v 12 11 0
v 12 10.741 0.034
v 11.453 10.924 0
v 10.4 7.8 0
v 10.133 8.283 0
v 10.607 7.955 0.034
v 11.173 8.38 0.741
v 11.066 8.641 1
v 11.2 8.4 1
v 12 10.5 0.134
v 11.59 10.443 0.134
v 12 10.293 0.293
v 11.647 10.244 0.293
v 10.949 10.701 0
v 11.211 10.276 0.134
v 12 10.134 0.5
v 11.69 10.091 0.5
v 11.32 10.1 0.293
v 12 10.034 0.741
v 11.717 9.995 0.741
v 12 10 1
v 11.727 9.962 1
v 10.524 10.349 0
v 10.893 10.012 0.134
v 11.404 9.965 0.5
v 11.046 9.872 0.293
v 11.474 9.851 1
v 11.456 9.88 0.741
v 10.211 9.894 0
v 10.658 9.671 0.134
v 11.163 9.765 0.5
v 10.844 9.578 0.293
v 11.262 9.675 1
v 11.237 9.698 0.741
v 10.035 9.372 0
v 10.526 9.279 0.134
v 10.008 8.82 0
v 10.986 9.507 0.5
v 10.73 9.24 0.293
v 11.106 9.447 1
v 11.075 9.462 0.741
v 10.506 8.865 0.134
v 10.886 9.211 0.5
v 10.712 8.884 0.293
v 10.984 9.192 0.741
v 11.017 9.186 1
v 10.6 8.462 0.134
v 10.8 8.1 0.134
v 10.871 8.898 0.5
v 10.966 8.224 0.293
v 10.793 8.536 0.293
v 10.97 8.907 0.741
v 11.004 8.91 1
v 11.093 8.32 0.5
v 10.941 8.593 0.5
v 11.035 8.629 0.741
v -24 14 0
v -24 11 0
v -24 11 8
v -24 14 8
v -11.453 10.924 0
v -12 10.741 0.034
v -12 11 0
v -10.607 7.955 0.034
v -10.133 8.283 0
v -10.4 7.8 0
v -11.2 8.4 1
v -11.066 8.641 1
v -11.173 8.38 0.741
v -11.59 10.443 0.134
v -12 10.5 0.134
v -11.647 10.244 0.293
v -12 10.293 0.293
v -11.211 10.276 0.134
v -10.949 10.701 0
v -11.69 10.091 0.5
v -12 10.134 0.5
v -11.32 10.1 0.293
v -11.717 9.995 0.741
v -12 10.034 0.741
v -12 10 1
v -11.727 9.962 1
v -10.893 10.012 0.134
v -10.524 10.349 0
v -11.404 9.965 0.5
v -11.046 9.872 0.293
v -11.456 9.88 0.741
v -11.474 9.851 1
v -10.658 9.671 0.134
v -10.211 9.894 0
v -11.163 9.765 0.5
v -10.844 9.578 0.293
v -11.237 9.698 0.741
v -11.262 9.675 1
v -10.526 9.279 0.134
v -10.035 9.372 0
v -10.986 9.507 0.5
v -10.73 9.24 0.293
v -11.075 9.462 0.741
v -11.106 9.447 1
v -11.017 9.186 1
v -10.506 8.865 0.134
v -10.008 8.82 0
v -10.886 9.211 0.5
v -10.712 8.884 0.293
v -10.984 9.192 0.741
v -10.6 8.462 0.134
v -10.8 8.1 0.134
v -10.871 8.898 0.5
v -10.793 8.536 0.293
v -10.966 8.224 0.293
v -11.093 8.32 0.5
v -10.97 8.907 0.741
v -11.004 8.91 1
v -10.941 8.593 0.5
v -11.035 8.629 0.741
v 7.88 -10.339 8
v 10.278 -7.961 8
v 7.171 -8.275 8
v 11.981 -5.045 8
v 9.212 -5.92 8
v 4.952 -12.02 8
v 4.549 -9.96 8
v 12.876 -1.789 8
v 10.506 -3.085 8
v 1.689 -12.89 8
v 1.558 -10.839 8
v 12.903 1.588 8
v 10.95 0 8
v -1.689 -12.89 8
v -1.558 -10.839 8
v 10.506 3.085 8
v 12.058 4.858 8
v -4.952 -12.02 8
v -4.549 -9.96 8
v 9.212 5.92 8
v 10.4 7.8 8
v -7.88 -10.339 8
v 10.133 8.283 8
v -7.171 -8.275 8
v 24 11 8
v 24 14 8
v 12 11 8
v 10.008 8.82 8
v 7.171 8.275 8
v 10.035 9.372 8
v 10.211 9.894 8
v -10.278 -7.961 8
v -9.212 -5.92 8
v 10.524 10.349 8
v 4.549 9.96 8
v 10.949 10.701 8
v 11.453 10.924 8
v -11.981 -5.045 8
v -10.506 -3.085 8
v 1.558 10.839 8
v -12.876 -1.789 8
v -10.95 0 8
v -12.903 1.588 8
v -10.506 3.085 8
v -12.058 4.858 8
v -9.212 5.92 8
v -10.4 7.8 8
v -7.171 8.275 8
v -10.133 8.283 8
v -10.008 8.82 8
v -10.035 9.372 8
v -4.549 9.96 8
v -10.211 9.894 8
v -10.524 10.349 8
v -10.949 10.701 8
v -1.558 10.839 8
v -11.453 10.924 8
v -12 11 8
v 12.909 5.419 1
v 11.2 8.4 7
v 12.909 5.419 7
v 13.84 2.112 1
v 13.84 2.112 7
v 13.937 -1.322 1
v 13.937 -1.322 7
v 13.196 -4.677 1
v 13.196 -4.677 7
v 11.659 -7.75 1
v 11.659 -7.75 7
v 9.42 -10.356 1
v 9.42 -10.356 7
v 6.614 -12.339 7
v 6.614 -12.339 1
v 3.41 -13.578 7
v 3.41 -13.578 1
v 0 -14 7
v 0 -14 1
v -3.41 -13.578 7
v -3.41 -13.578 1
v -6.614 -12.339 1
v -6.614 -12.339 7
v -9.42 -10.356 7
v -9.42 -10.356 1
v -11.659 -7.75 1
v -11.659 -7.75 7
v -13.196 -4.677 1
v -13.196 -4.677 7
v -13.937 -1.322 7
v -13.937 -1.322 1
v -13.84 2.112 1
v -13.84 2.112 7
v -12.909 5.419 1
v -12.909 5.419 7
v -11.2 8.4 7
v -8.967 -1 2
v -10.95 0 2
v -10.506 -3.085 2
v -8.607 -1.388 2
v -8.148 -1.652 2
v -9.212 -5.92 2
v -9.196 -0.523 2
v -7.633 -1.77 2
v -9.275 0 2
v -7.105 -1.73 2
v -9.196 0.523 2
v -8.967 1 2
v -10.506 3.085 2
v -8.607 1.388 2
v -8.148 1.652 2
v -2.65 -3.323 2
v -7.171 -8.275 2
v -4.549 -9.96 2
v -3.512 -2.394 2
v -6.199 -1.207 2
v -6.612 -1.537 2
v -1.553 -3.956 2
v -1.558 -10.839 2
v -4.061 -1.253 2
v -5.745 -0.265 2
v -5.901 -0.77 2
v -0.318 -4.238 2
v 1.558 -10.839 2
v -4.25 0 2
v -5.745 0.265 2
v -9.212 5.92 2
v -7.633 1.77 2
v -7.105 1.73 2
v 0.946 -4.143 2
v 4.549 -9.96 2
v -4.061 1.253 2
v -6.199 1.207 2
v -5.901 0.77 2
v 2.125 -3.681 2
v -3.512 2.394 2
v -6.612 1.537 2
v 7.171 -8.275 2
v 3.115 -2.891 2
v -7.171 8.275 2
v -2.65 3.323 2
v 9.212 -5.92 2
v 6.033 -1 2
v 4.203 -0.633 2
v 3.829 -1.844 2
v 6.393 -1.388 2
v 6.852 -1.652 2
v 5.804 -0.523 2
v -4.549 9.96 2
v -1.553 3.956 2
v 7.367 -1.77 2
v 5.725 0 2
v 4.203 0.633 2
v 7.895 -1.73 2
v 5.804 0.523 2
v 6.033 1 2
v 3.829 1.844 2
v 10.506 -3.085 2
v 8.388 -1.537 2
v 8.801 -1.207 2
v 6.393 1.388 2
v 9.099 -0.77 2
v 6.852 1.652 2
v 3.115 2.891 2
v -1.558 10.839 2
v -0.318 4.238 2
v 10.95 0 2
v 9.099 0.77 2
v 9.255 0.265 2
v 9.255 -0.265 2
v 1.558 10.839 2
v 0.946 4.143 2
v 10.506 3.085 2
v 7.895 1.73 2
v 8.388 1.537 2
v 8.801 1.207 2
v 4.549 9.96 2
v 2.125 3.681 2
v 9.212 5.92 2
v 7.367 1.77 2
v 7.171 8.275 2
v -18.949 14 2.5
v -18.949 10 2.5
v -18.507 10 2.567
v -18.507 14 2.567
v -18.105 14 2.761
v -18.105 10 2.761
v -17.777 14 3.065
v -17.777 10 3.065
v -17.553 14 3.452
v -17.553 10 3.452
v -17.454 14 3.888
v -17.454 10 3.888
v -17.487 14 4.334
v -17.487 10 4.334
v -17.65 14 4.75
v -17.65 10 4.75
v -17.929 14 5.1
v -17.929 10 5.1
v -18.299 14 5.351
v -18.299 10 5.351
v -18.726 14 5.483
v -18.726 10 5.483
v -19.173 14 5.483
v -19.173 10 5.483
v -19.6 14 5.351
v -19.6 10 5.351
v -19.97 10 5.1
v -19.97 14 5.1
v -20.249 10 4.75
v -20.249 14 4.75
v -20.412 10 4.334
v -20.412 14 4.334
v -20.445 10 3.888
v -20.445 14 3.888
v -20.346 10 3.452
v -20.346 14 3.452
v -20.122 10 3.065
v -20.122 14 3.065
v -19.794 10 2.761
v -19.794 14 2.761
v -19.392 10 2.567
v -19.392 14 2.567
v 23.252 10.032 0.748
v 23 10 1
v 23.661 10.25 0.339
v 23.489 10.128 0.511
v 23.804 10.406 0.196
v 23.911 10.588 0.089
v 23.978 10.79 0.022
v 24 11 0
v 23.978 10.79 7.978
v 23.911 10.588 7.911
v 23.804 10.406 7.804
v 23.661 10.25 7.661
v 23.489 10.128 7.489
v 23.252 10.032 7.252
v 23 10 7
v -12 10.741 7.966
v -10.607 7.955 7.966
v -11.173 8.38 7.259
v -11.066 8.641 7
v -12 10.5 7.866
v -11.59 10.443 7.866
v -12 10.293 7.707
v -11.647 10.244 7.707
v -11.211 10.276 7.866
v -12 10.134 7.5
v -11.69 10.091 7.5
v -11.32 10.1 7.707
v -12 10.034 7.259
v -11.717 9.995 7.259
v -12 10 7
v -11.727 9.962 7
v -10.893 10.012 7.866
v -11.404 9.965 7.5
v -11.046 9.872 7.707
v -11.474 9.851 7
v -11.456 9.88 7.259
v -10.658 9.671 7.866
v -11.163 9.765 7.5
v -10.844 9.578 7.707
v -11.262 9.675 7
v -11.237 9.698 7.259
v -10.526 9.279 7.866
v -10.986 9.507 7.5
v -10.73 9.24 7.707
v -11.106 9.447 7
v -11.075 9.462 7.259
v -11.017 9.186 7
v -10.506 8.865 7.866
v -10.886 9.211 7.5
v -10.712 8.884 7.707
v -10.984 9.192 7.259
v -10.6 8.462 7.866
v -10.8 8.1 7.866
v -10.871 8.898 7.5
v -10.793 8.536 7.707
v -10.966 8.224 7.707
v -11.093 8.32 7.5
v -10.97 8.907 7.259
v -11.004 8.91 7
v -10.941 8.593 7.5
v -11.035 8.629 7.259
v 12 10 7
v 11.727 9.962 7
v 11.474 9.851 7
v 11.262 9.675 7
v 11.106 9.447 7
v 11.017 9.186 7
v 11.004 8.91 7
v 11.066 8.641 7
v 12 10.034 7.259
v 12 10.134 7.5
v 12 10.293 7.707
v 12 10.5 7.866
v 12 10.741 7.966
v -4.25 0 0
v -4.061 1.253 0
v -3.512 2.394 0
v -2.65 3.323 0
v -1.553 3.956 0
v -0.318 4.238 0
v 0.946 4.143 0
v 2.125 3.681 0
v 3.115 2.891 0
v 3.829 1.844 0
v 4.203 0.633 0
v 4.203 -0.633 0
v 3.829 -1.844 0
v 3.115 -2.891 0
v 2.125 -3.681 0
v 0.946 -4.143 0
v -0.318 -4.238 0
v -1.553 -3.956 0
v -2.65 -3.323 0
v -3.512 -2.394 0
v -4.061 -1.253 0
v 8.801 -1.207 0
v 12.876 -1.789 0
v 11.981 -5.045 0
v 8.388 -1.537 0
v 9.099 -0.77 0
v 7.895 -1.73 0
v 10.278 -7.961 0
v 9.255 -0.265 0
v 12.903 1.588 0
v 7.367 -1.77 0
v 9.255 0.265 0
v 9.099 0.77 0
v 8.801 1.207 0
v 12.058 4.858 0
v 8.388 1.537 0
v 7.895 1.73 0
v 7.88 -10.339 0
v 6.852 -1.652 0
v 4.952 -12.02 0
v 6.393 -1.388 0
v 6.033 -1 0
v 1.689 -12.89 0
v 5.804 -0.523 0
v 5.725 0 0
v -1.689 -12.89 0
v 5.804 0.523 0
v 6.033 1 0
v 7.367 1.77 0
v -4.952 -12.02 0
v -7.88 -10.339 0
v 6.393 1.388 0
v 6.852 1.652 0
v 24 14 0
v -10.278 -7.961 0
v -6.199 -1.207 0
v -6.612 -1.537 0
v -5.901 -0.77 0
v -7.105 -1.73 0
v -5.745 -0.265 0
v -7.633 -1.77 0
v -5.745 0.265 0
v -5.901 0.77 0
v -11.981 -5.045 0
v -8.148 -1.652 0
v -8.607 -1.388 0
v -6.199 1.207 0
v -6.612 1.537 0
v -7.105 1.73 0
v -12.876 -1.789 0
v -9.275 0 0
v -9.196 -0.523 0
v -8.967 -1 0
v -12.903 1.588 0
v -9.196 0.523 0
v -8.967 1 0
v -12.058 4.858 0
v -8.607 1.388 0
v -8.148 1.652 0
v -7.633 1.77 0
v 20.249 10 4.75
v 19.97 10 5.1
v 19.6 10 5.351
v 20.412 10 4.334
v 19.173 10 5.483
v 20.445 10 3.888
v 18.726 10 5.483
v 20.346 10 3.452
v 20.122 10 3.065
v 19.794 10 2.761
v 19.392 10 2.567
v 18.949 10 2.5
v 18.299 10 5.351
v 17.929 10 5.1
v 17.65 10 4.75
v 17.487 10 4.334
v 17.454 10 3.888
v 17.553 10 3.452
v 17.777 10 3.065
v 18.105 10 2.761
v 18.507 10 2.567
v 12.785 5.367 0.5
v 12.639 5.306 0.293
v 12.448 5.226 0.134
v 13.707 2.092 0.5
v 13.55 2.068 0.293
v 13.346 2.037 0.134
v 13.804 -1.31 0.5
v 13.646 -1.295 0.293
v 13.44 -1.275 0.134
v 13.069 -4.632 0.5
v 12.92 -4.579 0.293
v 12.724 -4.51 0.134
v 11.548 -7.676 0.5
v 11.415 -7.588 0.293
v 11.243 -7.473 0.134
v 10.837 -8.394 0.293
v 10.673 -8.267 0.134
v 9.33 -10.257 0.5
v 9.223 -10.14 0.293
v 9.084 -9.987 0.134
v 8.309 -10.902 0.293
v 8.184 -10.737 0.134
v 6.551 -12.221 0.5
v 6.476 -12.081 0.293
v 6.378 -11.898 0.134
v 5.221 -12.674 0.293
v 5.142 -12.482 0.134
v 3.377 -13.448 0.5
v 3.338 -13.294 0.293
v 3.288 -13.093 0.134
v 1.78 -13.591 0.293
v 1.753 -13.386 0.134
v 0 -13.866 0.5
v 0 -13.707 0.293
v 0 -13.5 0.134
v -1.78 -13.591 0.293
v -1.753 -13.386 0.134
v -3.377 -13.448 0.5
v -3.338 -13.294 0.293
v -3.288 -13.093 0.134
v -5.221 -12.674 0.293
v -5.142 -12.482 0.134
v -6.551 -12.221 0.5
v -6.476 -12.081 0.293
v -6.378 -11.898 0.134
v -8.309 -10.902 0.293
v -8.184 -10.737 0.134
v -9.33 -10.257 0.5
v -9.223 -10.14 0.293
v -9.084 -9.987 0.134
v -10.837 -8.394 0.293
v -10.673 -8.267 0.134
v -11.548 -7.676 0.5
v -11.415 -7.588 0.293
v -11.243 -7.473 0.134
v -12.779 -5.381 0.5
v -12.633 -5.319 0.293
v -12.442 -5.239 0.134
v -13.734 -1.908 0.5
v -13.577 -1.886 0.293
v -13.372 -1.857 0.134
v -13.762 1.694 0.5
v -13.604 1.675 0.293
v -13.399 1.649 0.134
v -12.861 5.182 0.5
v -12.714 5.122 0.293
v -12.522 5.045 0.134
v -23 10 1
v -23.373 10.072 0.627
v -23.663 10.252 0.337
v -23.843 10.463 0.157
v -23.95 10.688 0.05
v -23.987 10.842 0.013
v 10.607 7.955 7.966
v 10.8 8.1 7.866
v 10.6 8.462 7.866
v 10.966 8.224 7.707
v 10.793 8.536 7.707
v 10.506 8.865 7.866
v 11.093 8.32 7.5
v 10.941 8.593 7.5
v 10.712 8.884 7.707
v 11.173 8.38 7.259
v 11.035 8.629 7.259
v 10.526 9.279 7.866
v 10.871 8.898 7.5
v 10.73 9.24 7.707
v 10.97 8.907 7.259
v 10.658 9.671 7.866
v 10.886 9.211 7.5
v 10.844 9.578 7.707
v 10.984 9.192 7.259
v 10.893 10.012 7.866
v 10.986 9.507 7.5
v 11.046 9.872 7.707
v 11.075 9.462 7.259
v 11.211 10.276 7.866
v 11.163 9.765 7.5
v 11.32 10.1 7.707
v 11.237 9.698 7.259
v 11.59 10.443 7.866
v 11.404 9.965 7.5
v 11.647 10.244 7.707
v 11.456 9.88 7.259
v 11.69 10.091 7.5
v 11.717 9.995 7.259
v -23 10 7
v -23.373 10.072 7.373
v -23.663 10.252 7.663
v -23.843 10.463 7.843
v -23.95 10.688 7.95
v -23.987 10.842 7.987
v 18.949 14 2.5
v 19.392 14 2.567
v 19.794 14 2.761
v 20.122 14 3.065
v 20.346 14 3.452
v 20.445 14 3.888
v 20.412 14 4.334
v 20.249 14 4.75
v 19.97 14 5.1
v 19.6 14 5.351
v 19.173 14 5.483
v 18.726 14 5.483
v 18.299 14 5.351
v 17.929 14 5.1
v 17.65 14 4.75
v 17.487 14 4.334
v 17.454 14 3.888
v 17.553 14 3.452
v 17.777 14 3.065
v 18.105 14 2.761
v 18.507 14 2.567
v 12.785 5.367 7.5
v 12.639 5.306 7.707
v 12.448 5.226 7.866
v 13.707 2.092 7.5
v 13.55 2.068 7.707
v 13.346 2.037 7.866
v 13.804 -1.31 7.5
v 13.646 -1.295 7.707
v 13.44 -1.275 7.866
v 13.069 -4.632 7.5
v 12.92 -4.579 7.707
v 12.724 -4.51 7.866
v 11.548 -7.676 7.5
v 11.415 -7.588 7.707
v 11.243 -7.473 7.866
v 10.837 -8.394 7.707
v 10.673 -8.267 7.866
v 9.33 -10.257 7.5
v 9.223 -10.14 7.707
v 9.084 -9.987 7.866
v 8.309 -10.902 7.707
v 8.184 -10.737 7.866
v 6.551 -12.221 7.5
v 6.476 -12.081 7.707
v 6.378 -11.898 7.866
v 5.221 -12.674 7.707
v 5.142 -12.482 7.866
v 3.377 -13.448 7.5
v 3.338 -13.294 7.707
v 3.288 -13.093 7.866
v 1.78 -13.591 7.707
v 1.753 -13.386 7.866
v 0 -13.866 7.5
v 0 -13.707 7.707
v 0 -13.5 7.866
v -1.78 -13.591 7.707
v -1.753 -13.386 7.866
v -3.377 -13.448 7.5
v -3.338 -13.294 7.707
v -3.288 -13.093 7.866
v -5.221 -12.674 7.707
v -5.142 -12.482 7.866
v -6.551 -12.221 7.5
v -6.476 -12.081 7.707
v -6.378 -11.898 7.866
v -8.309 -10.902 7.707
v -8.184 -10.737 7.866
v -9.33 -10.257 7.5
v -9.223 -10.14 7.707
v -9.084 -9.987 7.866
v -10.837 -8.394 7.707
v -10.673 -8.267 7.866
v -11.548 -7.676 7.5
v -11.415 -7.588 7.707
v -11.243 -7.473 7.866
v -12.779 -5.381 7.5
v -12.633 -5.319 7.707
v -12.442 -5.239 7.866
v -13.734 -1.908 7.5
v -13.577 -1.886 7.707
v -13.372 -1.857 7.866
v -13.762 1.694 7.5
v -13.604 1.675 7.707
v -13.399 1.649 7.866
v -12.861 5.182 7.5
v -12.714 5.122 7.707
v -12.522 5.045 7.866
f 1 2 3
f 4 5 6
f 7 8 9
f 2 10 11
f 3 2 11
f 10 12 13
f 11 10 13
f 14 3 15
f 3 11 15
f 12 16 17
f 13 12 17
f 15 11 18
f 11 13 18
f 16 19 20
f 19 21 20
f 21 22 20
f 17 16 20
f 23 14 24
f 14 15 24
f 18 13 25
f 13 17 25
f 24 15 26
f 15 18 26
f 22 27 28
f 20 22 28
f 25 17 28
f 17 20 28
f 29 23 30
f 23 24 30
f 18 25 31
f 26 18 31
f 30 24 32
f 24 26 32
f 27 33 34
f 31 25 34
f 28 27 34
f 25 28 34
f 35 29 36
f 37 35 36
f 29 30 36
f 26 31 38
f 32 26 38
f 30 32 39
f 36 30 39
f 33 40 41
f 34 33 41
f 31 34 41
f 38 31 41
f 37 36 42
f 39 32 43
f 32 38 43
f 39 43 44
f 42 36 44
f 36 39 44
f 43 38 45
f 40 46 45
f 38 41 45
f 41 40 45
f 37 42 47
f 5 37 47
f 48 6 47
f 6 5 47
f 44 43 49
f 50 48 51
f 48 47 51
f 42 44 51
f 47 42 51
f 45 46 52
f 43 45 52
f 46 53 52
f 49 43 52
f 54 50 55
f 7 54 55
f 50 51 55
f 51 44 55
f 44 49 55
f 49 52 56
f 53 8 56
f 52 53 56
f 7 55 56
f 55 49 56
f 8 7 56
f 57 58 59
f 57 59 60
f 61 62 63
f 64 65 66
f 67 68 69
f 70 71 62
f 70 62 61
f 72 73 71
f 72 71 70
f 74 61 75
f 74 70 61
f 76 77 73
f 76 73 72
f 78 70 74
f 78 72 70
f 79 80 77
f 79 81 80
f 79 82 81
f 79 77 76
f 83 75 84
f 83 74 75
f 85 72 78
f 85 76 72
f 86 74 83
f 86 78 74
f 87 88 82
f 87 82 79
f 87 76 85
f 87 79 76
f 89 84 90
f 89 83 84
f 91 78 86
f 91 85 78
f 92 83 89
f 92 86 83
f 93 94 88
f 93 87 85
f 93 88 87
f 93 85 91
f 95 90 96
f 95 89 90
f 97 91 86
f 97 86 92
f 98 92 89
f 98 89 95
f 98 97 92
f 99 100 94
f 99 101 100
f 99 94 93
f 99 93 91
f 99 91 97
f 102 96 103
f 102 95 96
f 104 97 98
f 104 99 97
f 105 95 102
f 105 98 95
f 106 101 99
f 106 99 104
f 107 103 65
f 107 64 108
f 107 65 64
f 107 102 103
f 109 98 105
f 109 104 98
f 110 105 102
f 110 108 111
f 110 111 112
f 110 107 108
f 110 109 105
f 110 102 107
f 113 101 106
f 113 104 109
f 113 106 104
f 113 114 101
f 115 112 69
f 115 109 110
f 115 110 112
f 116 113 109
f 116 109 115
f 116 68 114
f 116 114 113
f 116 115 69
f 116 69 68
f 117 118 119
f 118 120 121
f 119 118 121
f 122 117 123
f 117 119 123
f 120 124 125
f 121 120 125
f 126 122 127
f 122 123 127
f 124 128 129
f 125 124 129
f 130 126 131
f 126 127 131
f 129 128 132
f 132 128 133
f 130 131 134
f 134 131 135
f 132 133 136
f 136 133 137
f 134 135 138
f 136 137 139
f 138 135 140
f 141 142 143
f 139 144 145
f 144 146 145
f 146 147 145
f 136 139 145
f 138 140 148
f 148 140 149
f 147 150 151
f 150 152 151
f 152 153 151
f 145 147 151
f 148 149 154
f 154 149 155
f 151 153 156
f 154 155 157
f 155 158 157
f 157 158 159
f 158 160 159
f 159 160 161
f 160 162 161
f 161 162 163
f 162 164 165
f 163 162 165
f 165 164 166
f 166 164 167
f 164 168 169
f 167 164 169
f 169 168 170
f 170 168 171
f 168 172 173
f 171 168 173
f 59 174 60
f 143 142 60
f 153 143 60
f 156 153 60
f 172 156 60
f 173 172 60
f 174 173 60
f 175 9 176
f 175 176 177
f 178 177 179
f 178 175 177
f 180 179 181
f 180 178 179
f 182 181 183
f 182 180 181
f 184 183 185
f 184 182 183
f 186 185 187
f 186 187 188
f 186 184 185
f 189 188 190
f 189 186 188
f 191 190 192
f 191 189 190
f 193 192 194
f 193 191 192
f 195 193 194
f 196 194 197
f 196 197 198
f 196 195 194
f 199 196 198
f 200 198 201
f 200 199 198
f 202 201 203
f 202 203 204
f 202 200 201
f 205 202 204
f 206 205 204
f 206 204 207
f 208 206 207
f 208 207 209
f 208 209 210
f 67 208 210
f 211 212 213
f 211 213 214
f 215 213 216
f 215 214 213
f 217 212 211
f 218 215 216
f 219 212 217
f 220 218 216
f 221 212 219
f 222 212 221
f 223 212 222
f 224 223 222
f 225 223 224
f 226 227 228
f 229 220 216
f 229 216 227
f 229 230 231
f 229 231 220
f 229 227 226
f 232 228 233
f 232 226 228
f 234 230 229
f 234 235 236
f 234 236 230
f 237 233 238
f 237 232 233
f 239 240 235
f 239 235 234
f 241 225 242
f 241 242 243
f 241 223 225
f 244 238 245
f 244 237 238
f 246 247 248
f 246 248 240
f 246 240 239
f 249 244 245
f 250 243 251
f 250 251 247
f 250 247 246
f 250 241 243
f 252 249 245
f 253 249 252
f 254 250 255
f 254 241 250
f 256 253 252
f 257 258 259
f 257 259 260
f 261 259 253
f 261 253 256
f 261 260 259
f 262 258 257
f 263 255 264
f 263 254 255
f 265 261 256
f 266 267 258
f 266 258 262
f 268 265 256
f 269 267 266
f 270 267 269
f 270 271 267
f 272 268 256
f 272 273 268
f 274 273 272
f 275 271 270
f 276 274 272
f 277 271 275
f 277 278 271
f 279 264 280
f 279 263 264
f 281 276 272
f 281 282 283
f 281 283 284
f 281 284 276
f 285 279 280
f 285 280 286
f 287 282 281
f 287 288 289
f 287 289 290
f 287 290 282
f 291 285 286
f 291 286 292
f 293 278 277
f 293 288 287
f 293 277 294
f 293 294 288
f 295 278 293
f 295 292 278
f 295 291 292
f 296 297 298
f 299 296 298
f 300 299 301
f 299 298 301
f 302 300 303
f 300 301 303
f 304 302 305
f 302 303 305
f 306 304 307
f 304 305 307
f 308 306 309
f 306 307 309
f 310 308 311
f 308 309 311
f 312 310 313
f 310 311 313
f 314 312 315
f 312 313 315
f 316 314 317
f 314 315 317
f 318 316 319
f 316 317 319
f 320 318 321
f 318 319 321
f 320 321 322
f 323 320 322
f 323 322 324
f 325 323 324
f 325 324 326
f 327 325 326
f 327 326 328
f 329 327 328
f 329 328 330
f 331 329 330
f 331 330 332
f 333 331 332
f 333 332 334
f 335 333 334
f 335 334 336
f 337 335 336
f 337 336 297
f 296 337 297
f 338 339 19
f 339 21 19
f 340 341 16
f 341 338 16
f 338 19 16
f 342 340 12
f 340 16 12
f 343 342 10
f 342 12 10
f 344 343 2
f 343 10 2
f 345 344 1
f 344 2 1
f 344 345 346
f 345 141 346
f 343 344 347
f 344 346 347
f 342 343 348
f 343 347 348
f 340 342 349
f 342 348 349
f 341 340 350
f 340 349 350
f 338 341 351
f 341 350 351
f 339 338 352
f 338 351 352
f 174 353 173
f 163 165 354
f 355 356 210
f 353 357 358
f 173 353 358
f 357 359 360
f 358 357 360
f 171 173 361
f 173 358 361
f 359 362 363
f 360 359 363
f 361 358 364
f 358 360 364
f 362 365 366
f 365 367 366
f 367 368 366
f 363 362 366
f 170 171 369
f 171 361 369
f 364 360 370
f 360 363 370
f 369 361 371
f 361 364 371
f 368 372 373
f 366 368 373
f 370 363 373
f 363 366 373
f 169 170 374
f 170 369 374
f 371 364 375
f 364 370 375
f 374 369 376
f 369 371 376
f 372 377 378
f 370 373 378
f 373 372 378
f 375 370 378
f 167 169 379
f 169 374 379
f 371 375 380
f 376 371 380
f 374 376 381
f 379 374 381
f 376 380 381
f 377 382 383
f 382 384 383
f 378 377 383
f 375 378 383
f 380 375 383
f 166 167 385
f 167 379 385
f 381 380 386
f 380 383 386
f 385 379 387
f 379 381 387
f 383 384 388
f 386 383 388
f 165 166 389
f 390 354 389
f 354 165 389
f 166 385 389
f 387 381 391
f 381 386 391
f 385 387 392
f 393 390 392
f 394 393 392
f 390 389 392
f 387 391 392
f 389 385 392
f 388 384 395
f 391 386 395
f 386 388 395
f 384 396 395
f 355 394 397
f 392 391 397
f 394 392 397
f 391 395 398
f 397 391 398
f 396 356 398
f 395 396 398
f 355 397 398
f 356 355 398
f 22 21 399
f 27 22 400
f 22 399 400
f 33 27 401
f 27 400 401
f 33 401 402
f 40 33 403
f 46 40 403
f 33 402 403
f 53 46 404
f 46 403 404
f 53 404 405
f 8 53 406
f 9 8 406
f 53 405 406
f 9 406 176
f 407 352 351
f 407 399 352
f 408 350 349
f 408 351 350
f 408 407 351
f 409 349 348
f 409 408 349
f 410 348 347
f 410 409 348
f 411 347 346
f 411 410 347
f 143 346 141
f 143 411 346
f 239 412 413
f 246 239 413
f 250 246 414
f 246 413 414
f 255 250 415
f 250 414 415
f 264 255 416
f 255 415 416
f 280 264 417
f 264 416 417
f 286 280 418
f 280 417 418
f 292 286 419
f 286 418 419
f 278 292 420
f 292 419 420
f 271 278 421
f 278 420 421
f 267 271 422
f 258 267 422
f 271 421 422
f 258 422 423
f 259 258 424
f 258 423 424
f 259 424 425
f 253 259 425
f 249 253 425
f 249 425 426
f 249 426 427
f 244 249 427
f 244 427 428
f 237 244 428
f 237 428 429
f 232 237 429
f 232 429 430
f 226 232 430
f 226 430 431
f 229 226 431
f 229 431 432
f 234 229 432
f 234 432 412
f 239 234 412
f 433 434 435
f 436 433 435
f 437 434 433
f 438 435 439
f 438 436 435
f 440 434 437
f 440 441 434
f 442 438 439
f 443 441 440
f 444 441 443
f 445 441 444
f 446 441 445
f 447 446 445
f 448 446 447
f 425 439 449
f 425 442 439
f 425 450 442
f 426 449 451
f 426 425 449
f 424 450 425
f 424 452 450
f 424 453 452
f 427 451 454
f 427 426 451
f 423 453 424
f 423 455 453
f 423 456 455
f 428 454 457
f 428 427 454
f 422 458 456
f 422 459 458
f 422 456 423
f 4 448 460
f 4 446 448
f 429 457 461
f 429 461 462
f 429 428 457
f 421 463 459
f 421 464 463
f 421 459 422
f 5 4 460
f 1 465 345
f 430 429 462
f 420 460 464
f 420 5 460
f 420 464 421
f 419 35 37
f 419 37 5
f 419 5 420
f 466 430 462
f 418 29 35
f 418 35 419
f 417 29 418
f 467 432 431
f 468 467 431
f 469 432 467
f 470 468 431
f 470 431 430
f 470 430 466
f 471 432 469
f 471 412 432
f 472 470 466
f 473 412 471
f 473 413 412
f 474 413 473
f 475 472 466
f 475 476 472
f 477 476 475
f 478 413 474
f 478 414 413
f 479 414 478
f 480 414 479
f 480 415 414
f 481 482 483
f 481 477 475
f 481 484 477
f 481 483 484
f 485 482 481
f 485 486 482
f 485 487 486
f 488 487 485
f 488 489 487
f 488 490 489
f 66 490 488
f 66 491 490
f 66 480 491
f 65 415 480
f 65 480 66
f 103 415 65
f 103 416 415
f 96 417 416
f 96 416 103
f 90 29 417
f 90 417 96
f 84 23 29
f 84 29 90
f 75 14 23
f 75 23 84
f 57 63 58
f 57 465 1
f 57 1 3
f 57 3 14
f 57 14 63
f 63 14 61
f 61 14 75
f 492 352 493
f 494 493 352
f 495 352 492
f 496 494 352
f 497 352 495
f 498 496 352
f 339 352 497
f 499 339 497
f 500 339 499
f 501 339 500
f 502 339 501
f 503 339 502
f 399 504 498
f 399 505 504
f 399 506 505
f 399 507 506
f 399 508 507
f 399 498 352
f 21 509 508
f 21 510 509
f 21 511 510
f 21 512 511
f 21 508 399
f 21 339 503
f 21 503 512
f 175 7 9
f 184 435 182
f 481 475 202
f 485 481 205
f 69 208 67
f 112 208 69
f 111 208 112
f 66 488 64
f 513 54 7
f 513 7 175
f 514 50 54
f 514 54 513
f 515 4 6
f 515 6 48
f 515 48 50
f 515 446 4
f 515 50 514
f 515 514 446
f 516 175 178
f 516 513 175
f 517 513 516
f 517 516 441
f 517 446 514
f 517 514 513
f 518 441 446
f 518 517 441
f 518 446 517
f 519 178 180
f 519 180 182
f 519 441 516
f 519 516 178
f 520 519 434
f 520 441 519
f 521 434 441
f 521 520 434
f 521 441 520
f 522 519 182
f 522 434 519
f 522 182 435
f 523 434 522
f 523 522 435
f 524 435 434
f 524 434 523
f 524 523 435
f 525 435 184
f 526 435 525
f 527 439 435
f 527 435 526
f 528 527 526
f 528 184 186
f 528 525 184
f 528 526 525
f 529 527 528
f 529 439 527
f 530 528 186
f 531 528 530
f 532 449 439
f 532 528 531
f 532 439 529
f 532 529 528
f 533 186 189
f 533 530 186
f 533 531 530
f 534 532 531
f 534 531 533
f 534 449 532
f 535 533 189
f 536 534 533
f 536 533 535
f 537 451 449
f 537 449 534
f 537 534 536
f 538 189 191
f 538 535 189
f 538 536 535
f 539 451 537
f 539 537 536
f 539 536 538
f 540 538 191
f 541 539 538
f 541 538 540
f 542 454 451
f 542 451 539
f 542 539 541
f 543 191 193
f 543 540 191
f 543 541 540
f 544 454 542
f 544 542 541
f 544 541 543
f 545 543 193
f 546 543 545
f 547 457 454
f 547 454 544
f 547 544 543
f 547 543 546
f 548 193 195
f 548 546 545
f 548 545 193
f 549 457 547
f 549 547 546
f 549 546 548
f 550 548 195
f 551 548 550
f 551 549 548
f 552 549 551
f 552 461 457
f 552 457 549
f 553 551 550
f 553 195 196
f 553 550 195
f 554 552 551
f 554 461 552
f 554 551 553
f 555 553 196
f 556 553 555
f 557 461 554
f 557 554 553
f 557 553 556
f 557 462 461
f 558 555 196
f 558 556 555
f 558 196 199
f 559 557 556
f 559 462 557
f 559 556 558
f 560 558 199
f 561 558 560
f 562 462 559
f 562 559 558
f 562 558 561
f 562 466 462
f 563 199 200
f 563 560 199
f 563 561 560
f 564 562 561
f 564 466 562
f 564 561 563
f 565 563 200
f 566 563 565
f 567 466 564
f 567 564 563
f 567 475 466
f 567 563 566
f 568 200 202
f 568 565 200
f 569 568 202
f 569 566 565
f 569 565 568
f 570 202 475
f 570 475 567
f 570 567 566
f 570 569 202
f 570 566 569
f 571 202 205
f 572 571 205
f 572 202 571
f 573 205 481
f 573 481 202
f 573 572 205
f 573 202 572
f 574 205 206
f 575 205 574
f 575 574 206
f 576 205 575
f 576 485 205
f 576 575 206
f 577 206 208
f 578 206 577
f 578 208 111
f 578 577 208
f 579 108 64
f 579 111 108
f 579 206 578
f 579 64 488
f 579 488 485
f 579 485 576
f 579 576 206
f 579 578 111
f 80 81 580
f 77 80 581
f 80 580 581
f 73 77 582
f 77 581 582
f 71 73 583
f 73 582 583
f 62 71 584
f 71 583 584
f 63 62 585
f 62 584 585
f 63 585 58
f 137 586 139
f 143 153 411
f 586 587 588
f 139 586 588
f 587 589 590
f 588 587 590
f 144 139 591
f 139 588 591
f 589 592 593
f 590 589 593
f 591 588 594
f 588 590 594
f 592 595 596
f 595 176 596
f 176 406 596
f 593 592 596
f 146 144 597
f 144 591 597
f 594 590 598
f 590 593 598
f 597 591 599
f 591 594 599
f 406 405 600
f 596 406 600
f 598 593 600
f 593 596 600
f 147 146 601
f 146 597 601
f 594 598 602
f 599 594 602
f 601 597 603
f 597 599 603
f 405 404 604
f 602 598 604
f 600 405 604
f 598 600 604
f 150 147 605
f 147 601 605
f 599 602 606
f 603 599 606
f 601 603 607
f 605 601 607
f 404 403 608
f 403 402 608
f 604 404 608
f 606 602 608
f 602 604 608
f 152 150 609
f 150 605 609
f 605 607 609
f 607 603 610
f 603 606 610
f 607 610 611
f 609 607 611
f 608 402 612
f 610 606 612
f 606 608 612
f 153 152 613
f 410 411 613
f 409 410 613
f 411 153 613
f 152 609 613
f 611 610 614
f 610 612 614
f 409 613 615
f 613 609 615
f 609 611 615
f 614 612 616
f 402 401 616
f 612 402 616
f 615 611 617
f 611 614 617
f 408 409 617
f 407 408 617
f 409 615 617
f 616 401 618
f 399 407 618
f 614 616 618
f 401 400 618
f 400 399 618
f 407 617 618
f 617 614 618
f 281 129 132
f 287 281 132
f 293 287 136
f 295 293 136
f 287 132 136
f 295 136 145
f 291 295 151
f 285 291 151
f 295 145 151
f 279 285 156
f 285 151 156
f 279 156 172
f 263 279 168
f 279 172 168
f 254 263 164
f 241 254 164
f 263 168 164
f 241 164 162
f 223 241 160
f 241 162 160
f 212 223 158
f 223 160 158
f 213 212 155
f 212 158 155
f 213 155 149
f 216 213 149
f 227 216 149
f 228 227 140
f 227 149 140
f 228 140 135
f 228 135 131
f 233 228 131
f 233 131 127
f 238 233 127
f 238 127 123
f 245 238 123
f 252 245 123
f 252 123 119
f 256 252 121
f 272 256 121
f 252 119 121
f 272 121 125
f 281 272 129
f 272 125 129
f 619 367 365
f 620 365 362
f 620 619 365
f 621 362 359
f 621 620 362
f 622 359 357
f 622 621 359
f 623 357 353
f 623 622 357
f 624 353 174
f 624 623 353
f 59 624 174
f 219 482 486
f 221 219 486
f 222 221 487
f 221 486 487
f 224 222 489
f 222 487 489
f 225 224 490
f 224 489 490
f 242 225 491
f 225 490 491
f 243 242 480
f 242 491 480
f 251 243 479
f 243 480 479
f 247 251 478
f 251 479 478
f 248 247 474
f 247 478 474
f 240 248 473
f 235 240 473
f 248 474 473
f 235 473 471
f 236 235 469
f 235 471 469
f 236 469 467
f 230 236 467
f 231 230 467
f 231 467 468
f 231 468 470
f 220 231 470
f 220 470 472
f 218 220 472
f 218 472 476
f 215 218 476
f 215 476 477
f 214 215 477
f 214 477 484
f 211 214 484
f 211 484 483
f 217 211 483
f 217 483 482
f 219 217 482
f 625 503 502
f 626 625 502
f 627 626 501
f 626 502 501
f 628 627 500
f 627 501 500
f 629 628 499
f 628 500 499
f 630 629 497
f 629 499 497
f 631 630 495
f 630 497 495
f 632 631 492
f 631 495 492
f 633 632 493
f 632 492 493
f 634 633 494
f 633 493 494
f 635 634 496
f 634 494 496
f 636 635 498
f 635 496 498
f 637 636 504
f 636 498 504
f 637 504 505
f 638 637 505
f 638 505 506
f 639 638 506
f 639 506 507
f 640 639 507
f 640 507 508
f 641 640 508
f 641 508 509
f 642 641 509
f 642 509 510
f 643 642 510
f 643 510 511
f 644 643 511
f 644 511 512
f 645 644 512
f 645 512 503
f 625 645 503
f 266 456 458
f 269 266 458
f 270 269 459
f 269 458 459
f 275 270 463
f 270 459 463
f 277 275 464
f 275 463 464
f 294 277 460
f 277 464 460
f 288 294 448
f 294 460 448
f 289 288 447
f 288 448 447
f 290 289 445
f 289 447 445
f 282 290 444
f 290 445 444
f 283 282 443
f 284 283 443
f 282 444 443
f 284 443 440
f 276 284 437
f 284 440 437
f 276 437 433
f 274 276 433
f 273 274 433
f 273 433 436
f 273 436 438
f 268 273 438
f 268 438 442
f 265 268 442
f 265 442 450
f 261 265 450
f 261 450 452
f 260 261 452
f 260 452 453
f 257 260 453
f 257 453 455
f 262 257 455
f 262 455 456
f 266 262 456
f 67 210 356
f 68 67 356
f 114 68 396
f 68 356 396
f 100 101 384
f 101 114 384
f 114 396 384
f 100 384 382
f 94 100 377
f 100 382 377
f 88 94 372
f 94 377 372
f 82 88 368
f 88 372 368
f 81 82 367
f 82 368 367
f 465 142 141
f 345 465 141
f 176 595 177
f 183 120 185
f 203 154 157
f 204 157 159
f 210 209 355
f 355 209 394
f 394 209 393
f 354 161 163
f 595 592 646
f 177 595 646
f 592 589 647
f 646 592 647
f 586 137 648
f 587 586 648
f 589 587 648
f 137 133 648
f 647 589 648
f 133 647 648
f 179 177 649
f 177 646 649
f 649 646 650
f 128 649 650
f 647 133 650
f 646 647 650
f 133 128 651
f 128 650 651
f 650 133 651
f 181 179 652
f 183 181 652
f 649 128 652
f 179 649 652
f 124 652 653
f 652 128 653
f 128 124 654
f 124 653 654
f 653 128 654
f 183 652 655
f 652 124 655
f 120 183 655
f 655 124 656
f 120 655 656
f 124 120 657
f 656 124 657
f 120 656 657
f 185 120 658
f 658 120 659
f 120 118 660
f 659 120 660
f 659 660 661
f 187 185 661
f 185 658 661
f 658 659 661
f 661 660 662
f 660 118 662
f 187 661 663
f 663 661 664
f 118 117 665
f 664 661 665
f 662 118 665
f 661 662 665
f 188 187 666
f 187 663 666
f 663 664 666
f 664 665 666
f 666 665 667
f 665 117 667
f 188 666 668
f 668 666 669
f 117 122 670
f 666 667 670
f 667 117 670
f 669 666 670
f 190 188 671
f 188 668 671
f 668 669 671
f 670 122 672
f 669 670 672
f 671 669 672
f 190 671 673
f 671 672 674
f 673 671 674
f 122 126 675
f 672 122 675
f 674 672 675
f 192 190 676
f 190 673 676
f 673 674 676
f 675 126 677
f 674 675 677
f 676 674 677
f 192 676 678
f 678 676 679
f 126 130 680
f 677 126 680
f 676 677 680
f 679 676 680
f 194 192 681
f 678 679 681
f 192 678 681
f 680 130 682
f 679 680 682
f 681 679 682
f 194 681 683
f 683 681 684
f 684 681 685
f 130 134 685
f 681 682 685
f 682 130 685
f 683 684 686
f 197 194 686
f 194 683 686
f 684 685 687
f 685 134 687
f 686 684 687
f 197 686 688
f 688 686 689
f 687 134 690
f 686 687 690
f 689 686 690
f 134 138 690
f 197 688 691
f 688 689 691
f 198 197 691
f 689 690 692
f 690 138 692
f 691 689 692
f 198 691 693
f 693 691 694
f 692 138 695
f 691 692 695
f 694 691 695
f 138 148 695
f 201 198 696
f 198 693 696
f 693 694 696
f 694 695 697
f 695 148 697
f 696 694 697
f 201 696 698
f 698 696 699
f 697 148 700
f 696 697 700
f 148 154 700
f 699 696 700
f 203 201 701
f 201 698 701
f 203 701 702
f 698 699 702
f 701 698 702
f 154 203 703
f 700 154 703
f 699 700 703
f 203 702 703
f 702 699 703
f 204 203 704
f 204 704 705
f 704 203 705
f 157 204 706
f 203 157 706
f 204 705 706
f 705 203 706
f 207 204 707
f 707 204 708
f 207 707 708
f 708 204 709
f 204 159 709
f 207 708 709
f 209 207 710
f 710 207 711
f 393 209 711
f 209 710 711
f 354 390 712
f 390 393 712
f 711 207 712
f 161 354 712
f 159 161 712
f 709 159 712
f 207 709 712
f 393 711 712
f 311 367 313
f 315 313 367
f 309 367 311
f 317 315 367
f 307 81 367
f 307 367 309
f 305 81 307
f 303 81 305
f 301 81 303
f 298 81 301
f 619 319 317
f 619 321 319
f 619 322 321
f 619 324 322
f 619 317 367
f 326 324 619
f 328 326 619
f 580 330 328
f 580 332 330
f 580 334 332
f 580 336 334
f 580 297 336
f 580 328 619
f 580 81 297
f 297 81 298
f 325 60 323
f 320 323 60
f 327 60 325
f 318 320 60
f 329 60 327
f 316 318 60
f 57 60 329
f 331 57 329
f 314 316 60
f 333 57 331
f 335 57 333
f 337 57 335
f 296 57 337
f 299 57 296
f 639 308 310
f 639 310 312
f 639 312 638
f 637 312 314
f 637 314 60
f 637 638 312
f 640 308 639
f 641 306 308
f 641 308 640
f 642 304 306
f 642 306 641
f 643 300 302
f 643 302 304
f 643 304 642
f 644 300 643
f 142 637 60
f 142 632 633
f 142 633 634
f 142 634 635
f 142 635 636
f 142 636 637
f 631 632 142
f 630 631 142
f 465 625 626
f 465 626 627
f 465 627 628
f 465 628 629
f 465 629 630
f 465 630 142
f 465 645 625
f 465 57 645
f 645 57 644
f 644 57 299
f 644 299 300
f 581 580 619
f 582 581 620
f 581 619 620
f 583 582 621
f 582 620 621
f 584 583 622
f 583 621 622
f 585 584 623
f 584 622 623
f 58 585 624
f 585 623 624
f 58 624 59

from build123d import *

# Parameters (mm, degrees)
SALIENTE_EXTRUIR1_DEPTH = 8
REDONDEO1_R             = 1
CROQUIS2_R              = 1.5
CORTAR_EXTRUIR1_DEPTH   = 35.871191617
CROQUIS3_R              = 10.95
CORTAR_EXTRUIR2_DEPTH   = 6
CROQUIS4_R              = 4.25
CROQUIS4_R_2            = 1.775
CORTAR_EXTRUIR3_DEPTH   = 29.913664638


with BuildPart() as part:
    # Croquis1 → Saliente-Extruir1 (new body)
    with BuildSketch(Plane.XY):
        with BuildLine():
            Line((0, 14), (24, 14))
            Line((24, 14), (24, 10))
            Line((24, 10), (9.797958971, 10))
            ThreePointArc((9.797958971, 10), (0, -14), (-9.797958971, 10))
            Line((-9.797958971, 10), (-24, 10))
            Line((-24, 10), (-24, 14))
            Line((-24, 14), (0, 14))
        make_face()
    extrude(amount=SALIENTE_EXTRUIR1_DEPTH)

    # Redondeo1
    redondeo1_edges = [part.edges().sort_by_distance(p)[0] for p in [
        (-9.797958971, 10, 4),
        (-24, 10, 4),
        (24, 10, 4),
        (9.797958971, 10, 4),
        (-16.898979486, 10, 8),
        (0, -14, 8),
        (-16.898979486, 10, 0),
        (16.898979486, 10, 8),
        (16.898979486, 10, 0),
        (0, -14, 0),
    ]]
    fillet(redondeo1_edges, radius=REDONDEO1_R)

    # Croquis2 → Cortar-Extruir1 (cut, through all)
    with BuildSketch(Plane.XZ.offset(-10)):
        with Locations(Location((-18.949489743, 4, 0), (0, 0, 270))):
            Circle(CROQUIS2_R)
        with Locations(Location((18.949489743, 4, 0), (0, 0, 270))):
            Circle(CROQUIS2_R)
    extrude(amount=-CORTAR_EXTRUIR1_DEPTH, mode=Mode.SUBTRACT)

    # Croquis3 → Cortar-Extruir2 (cut)
    with BuildSketch(Plane.XY.offset(8)):
        Circle(CROQUIS3_R)
    extrude(amount=-CORTAR_EXTRUIR2_DEPTH, mode=Mode.SUBTRACT)

    # Croquis4 → Cortar-Extruir3 (cut, through all)
    with BuildSketch(Plane(origin=(0, 0, 0), x_dir=(-1, 0, 0), z_dir=(0, 0, -1))):
        Circle(CROQUIS4_R)
        with Locations((7.5, 0)):
            Circle(CROQUIS4_R_2)
        with Locations((-7.5, 0)):
            Circle(CROQUIS4_R_2)
    extrude(amount=-CORTAR_EXTRUIR3_DEPTH, mode=Mode.SUBTRACT)


solid = part.part
